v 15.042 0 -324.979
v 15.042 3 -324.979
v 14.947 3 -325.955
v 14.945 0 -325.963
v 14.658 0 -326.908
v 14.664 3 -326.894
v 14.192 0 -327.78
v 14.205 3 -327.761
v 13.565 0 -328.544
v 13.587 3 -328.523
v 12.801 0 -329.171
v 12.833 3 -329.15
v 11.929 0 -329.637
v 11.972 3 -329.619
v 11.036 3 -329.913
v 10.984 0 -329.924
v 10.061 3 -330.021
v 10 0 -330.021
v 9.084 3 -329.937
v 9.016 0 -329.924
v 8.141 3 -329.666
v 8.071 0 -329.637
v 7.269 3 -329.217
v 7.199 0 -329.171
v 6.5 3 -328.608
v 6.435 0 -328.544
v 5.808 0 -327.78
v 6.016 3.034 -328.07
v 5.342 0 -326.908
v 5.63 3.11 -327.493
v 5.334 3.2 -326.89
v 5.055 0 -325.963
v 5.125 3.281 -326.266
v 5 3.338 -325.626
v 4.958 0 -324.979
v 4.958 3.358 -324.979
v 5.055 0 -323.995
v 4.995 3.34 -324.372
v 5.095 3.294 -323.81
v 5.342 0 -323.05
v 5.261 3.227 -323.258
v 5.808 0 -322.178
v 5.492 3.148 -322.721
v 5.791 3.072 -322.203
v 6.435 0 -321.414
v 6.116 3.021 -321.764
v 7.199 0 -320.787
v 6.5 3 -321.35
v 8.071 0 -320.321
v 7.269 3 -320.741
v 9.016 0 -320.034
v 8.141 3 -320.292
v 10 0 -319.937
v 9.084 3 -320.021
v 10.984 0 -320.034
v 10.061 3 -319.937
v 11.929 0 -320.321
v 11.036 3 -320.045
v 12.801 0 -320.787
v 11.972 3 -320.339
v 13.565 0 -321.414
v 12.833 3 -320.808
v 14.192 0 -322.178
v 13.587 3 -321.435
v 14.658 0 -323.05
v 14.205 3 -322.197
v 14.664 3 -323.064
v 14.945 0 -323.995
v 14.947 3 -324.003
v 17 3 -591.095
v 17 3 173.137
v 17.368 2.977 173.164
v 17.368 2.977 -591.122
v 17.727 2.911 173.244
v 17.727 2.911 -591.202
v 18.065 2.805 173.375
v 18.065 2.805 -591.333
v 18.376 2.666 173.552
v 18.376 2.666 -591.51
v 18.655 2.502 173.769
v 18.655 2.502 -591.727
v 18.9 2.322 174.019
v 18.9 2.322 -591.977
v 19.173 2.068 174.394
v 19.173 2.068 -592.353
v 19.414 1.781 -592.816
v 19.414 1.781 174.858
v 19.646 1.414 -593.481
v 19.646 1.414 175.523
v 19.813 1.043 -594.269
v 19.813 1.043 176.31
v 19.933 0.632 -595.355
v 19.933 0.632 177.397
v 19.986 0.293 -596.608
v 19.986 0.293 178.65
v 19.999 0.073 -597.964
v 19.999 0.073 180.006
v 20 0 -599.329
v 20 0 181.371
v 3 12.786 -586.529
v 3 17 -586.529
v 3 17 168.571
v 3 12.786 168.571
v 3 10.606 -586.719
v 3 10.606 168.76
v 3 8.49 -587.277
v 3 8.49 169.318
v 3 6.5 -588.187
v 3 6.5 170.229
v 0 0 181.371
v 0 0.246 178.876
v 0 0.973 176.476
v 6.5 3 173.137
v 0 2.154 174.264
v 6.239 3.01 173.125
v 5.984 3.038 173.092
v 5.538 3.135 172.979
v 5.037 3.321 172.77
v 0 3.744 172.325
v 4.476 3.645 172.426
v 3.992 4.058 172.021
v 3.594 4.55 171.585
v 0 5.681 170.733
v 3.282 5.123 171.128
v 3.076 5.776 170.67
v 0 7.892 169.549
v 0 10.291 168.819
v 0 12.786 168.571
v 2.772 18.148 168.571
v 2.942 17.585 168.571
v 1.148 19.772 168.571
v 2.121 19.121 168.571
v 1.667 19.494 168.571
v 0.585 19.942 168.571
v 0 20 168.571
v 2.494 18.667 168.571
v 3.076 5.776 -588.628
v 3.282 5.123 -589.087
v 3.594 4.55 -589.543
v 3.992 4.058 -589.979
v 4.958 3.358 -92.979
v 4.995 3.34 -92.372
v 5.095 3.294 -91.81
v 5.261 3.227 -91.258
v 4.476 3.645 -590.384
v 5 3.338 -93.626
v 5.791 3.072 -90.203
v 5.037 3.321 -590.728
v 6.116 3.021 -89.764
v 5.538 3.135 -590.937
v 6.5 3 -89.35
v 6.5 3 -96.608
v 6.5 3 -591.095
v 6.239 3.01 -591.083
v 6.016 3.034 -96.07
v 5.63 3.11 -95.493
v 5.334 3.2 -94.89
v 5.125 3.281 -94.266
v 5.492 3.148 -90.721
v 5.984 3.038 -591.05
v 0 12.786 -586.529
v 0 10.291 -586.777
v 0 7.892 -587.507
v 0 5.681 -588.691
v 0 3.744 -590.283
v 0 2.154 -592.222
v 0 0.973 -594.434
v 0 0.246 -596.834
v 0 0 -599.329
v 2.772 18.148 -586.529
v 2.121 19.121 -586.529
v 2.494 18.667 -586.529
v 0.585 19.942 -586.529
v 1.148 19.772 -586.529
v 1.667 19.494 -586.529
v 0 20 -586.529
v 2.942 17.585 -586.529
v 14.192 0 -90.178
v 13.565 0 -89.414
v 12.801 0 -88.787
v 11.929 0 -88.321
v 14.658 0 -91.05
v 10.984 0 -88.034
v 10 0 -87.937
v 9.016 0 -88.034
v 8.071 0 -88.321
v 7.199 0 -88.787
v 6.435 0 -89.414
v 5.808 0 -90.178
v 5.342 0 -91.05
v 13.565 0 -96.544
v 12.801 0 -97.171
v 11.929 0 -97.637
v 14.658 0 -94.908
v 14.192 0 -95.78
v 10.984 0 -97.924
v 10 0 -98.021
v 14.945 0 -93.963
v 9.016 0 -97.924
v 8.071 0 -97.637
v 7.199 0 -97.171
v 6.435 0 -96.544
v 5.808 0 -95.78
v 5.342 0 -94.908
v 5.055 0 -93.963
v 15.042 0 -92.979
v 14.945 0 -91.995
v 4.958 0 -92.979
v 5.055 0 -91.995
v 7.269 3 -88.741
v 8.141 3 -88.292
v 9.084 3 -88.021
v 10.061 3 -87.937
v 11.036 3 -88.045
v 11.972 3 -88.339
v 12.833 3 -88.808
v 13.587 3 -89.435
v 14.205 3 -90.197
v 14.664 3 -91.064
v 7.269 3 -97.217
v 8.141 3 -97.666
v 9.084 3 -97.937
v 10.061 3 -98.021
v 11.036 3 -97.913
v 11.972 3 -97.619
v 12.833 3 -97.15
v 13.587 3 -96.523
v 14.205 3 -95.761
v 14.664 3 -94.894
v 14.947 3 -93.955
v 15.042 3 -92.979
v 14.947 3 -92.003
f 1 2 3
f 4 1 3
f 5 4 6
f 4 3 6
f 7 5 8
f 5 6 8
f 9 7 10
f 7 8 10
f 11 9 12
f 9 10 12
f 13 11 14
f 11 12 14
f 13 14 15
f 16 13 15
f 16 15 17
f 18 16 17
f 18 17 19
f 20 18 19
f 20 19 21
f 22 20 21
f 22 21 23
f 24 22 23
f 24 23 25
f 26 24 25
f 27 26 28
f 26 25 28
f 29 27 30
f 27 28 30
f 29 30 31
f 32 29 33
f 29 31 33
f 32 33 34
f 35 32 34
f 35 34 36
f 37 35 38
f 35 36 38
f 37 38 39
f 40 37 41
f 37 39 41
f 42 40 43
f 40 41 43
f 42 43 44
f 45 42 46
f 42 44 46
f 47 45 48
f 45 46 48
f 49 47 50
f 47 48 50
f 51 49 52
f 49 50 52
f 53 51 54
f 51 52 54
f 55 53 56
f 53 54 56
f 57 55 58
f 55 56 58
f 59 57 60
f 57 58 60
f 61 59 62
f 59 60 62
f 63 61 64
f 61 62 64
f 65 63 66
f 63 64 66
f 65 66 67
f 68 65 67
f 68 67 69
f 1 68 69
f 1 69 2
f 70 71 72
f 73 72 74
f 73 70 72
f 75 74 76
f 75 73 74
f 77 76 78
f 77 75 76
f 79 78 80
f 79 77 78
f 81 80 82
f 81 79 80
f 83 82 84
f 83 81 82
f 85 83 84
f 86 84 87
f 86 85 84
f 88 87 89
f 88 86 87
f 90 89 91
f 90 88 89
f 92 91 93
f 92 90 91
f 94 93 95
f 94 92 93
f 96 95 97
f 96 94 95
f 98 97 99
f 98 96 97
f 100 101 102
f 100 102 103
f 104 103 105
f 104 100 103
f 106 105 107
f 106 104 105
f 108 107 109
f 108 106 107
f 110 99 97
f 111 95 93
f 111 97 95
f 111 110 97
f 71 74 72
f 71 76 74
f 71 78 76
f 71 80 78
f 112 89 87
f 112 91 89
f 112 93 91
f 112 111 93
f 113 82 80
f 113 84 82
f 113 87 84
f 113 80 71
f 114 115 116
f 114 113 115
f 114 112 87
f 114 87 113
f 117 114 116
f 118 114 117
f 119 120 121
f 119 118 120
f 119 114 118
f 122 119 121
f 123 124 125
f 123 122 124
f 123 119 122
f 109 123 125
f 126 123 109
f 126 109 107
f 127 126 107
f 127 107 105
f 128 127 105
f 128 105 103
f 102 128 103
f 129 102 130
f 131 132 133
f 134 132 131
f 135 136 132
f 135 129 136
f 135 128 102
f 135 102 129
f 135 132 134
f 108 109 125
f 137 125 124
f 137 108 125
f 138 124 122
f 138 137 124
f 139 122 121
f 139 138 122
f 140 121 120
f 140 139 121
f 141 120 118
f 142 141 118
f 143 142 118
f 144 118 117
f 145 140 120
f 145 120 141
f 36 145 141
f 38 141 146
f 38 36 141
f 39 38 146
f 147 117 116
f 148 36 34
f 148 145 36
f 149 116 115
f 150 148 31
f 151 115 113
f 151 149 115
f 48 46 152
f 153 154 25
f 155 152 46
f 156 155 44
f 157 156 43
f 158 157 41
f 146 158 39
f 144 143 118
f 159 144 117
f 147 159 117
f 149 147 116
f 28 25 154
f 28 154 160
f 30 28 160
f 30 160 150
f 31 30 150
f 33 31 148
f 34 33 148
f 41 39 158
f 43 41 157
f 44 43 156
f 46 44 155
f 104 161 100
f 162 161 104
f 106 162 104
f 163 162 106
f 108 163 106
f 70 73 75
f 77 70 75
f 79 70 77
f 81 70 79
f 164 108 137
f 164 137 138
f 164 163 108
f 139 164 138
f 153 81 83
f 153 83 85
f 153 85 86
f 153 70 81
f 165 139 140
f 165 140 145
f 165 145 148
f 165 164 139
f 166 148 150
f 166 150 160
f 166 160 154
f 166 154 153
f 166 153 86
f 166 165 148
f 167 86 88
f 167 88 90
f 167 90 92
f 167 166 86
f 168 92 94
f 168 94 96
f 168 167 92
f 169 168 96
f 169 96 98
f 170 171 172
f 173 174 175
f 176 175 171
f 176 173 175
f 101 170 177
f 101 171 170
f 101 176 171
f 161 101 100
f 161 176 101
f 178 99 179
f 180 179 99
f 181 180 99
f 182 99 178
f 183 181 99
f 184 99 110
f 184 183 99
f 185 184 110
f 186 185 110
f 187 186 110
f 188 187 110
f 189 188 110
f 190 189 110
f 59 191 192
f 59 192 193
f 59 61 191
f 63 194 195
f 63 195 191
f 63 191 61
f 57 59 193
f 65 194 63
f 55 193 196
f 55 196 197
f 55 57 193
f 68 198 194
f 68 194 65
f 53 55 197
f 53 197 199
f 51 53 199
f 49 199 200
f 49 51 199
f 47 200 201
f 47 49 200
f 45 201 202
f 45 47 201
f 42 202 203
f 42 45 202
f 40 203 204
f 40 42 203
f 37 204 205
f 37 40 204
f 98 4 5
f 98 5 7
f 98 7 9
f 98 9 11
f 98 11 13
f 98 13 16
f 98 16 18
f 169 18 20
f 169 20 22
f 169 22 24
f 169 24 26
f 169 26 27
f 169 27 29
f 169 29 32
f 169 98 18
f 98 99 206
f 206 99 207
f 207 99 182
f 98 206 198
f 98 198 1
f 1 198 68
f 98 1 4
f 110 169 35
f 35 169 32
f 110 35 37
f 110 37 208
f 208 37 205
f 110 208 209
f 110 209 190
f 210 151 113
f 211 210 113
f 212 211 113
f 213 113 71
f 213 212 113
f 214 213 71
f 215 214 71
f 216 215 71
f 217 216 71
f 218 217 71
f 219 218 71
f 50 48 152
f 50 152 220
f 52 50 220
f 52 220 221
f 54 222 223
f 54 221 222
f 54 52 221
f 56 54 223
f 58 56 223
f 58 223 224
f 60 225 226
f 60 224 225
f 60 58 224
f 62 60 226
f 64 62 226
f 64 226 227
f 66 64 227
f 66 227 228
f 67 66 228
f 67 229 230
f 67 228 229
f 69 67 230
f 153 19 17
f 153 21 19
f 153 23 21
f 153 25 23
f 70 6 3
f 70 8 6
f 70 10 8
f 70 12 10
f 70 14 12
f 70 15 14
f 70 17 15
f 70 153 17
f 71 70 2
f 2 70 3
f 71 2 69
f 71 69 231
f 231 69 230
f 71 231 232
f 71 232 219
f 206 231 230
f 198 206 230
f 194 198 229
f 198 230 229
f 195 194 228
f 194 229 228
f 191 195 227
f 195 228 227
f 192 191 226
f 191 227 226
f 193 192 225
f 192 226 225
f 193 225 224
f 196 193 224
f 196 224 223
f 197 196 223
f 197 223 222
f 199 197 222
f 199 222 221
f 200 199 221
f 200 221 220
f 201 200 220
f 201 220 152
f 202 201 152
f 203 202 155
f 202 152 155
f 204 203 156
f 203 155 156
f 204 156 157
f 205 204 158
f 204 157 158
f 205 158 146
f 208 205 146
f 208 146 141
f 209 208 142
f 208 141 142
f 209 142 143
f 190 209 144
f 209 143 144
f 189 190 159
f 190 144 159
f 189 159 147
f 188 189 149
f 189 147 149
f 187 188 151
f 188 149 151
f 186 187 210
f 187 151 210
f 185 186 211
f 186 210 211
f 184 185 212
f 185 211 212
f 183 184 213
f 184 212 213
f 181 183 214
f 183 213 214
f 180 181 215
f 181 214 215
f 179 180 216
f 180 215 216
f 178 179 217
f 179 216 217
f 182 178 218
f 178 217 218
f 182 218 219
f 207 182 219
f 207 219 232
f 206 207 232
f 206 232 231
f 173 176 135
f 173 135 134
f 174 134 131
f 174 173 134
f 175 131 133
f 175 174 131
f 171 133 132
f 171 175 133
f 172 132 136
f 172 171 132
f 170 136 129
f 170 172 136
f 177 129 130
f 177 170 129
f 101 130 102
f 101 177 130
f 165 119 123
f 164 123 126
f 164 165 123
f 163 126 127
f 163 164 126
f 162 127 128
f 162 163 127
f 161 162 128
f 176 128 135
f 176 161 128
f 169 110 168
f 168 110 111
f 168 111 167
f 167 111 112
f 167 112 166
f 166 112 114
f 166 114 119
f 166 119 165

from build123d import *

# Parameters (mm, degrees)
MIEMBRO_ESTRUCTURAL1_DEPTH    = 780.7
CORTAR_EXTRUIR2_DEPTH         = 600.996074077
TALADRO_DE_MARGEN_PARA_3_81_D = 10.0838


with BuildPart() as part:
    # Sketch1 → Miembro estructural1 (new body)
    with BuildSketch(Plane.XY.offset(-599.329032258)):
        with BuildLine():
            Line((0, 0), (0, 20))
            ThreePointArc((0, 20), (2.121320344, 19.121320344), (3, 17))
            Line((3, 17), (3, 6.5))
            ThreePointArc((3, 6.5), (4.025126266, 4.025126266), (6.5, 3))
            Line((6.5, 3), (17, 3))
            ThreePointArc((17, 3), (19.121320344, 2.121320344), (20, 0))
            Line((20, 0), (0, 0))
        make_face()
    extrude(amount=MIEMBRO_ESTRUCTURAL1_DEPTH)

    # Croquis2 → Cortar-Extruir2 (cut, through all)
    with BuildSketch(Plane.YZ):
        with BuildLine():
            Line((20, 181.370967742), (0, 181.370967742))
            ThreePointArc((0, 181.370967742), (3.743979256, 172.325057712), (12.785701293, 168.570975728))
            Line((12.785701293, 168.570975728), (20, 168.570975728))
            Line((20, 168.570975728), (20, 181.370967742))
        make_face()
        with BuildLine():
            ThreePointArc((12.785701293, -586.529040245), (3.743979256, -590.283122228), (0, -599.329032258))
            Line((0, -599.329032258), (20, -599.329032258))
            Line((20, -599.329032258), (20, -586.529040245))
            Line((20, -586.529040245), (12.785701293, -586.529040245))
        make_face()
    extrude(amount=CORTAR_EXTRUIR2_DEPTH, mode=Mode.SUBTRACT)

    # Taladro de margen para 3/81 (through all)
    with Locations(Plane(origin=(0, 0, 0), x_dir=(-1, 0, 0), z_dir=(0, -1, 0))):
        with Locations((-10, 92.979032258), (-10, 324.979032258)):
            Hole(TALADRO_DE_MARGEN_PARA_3_81_D / 2)


solid = part.part
